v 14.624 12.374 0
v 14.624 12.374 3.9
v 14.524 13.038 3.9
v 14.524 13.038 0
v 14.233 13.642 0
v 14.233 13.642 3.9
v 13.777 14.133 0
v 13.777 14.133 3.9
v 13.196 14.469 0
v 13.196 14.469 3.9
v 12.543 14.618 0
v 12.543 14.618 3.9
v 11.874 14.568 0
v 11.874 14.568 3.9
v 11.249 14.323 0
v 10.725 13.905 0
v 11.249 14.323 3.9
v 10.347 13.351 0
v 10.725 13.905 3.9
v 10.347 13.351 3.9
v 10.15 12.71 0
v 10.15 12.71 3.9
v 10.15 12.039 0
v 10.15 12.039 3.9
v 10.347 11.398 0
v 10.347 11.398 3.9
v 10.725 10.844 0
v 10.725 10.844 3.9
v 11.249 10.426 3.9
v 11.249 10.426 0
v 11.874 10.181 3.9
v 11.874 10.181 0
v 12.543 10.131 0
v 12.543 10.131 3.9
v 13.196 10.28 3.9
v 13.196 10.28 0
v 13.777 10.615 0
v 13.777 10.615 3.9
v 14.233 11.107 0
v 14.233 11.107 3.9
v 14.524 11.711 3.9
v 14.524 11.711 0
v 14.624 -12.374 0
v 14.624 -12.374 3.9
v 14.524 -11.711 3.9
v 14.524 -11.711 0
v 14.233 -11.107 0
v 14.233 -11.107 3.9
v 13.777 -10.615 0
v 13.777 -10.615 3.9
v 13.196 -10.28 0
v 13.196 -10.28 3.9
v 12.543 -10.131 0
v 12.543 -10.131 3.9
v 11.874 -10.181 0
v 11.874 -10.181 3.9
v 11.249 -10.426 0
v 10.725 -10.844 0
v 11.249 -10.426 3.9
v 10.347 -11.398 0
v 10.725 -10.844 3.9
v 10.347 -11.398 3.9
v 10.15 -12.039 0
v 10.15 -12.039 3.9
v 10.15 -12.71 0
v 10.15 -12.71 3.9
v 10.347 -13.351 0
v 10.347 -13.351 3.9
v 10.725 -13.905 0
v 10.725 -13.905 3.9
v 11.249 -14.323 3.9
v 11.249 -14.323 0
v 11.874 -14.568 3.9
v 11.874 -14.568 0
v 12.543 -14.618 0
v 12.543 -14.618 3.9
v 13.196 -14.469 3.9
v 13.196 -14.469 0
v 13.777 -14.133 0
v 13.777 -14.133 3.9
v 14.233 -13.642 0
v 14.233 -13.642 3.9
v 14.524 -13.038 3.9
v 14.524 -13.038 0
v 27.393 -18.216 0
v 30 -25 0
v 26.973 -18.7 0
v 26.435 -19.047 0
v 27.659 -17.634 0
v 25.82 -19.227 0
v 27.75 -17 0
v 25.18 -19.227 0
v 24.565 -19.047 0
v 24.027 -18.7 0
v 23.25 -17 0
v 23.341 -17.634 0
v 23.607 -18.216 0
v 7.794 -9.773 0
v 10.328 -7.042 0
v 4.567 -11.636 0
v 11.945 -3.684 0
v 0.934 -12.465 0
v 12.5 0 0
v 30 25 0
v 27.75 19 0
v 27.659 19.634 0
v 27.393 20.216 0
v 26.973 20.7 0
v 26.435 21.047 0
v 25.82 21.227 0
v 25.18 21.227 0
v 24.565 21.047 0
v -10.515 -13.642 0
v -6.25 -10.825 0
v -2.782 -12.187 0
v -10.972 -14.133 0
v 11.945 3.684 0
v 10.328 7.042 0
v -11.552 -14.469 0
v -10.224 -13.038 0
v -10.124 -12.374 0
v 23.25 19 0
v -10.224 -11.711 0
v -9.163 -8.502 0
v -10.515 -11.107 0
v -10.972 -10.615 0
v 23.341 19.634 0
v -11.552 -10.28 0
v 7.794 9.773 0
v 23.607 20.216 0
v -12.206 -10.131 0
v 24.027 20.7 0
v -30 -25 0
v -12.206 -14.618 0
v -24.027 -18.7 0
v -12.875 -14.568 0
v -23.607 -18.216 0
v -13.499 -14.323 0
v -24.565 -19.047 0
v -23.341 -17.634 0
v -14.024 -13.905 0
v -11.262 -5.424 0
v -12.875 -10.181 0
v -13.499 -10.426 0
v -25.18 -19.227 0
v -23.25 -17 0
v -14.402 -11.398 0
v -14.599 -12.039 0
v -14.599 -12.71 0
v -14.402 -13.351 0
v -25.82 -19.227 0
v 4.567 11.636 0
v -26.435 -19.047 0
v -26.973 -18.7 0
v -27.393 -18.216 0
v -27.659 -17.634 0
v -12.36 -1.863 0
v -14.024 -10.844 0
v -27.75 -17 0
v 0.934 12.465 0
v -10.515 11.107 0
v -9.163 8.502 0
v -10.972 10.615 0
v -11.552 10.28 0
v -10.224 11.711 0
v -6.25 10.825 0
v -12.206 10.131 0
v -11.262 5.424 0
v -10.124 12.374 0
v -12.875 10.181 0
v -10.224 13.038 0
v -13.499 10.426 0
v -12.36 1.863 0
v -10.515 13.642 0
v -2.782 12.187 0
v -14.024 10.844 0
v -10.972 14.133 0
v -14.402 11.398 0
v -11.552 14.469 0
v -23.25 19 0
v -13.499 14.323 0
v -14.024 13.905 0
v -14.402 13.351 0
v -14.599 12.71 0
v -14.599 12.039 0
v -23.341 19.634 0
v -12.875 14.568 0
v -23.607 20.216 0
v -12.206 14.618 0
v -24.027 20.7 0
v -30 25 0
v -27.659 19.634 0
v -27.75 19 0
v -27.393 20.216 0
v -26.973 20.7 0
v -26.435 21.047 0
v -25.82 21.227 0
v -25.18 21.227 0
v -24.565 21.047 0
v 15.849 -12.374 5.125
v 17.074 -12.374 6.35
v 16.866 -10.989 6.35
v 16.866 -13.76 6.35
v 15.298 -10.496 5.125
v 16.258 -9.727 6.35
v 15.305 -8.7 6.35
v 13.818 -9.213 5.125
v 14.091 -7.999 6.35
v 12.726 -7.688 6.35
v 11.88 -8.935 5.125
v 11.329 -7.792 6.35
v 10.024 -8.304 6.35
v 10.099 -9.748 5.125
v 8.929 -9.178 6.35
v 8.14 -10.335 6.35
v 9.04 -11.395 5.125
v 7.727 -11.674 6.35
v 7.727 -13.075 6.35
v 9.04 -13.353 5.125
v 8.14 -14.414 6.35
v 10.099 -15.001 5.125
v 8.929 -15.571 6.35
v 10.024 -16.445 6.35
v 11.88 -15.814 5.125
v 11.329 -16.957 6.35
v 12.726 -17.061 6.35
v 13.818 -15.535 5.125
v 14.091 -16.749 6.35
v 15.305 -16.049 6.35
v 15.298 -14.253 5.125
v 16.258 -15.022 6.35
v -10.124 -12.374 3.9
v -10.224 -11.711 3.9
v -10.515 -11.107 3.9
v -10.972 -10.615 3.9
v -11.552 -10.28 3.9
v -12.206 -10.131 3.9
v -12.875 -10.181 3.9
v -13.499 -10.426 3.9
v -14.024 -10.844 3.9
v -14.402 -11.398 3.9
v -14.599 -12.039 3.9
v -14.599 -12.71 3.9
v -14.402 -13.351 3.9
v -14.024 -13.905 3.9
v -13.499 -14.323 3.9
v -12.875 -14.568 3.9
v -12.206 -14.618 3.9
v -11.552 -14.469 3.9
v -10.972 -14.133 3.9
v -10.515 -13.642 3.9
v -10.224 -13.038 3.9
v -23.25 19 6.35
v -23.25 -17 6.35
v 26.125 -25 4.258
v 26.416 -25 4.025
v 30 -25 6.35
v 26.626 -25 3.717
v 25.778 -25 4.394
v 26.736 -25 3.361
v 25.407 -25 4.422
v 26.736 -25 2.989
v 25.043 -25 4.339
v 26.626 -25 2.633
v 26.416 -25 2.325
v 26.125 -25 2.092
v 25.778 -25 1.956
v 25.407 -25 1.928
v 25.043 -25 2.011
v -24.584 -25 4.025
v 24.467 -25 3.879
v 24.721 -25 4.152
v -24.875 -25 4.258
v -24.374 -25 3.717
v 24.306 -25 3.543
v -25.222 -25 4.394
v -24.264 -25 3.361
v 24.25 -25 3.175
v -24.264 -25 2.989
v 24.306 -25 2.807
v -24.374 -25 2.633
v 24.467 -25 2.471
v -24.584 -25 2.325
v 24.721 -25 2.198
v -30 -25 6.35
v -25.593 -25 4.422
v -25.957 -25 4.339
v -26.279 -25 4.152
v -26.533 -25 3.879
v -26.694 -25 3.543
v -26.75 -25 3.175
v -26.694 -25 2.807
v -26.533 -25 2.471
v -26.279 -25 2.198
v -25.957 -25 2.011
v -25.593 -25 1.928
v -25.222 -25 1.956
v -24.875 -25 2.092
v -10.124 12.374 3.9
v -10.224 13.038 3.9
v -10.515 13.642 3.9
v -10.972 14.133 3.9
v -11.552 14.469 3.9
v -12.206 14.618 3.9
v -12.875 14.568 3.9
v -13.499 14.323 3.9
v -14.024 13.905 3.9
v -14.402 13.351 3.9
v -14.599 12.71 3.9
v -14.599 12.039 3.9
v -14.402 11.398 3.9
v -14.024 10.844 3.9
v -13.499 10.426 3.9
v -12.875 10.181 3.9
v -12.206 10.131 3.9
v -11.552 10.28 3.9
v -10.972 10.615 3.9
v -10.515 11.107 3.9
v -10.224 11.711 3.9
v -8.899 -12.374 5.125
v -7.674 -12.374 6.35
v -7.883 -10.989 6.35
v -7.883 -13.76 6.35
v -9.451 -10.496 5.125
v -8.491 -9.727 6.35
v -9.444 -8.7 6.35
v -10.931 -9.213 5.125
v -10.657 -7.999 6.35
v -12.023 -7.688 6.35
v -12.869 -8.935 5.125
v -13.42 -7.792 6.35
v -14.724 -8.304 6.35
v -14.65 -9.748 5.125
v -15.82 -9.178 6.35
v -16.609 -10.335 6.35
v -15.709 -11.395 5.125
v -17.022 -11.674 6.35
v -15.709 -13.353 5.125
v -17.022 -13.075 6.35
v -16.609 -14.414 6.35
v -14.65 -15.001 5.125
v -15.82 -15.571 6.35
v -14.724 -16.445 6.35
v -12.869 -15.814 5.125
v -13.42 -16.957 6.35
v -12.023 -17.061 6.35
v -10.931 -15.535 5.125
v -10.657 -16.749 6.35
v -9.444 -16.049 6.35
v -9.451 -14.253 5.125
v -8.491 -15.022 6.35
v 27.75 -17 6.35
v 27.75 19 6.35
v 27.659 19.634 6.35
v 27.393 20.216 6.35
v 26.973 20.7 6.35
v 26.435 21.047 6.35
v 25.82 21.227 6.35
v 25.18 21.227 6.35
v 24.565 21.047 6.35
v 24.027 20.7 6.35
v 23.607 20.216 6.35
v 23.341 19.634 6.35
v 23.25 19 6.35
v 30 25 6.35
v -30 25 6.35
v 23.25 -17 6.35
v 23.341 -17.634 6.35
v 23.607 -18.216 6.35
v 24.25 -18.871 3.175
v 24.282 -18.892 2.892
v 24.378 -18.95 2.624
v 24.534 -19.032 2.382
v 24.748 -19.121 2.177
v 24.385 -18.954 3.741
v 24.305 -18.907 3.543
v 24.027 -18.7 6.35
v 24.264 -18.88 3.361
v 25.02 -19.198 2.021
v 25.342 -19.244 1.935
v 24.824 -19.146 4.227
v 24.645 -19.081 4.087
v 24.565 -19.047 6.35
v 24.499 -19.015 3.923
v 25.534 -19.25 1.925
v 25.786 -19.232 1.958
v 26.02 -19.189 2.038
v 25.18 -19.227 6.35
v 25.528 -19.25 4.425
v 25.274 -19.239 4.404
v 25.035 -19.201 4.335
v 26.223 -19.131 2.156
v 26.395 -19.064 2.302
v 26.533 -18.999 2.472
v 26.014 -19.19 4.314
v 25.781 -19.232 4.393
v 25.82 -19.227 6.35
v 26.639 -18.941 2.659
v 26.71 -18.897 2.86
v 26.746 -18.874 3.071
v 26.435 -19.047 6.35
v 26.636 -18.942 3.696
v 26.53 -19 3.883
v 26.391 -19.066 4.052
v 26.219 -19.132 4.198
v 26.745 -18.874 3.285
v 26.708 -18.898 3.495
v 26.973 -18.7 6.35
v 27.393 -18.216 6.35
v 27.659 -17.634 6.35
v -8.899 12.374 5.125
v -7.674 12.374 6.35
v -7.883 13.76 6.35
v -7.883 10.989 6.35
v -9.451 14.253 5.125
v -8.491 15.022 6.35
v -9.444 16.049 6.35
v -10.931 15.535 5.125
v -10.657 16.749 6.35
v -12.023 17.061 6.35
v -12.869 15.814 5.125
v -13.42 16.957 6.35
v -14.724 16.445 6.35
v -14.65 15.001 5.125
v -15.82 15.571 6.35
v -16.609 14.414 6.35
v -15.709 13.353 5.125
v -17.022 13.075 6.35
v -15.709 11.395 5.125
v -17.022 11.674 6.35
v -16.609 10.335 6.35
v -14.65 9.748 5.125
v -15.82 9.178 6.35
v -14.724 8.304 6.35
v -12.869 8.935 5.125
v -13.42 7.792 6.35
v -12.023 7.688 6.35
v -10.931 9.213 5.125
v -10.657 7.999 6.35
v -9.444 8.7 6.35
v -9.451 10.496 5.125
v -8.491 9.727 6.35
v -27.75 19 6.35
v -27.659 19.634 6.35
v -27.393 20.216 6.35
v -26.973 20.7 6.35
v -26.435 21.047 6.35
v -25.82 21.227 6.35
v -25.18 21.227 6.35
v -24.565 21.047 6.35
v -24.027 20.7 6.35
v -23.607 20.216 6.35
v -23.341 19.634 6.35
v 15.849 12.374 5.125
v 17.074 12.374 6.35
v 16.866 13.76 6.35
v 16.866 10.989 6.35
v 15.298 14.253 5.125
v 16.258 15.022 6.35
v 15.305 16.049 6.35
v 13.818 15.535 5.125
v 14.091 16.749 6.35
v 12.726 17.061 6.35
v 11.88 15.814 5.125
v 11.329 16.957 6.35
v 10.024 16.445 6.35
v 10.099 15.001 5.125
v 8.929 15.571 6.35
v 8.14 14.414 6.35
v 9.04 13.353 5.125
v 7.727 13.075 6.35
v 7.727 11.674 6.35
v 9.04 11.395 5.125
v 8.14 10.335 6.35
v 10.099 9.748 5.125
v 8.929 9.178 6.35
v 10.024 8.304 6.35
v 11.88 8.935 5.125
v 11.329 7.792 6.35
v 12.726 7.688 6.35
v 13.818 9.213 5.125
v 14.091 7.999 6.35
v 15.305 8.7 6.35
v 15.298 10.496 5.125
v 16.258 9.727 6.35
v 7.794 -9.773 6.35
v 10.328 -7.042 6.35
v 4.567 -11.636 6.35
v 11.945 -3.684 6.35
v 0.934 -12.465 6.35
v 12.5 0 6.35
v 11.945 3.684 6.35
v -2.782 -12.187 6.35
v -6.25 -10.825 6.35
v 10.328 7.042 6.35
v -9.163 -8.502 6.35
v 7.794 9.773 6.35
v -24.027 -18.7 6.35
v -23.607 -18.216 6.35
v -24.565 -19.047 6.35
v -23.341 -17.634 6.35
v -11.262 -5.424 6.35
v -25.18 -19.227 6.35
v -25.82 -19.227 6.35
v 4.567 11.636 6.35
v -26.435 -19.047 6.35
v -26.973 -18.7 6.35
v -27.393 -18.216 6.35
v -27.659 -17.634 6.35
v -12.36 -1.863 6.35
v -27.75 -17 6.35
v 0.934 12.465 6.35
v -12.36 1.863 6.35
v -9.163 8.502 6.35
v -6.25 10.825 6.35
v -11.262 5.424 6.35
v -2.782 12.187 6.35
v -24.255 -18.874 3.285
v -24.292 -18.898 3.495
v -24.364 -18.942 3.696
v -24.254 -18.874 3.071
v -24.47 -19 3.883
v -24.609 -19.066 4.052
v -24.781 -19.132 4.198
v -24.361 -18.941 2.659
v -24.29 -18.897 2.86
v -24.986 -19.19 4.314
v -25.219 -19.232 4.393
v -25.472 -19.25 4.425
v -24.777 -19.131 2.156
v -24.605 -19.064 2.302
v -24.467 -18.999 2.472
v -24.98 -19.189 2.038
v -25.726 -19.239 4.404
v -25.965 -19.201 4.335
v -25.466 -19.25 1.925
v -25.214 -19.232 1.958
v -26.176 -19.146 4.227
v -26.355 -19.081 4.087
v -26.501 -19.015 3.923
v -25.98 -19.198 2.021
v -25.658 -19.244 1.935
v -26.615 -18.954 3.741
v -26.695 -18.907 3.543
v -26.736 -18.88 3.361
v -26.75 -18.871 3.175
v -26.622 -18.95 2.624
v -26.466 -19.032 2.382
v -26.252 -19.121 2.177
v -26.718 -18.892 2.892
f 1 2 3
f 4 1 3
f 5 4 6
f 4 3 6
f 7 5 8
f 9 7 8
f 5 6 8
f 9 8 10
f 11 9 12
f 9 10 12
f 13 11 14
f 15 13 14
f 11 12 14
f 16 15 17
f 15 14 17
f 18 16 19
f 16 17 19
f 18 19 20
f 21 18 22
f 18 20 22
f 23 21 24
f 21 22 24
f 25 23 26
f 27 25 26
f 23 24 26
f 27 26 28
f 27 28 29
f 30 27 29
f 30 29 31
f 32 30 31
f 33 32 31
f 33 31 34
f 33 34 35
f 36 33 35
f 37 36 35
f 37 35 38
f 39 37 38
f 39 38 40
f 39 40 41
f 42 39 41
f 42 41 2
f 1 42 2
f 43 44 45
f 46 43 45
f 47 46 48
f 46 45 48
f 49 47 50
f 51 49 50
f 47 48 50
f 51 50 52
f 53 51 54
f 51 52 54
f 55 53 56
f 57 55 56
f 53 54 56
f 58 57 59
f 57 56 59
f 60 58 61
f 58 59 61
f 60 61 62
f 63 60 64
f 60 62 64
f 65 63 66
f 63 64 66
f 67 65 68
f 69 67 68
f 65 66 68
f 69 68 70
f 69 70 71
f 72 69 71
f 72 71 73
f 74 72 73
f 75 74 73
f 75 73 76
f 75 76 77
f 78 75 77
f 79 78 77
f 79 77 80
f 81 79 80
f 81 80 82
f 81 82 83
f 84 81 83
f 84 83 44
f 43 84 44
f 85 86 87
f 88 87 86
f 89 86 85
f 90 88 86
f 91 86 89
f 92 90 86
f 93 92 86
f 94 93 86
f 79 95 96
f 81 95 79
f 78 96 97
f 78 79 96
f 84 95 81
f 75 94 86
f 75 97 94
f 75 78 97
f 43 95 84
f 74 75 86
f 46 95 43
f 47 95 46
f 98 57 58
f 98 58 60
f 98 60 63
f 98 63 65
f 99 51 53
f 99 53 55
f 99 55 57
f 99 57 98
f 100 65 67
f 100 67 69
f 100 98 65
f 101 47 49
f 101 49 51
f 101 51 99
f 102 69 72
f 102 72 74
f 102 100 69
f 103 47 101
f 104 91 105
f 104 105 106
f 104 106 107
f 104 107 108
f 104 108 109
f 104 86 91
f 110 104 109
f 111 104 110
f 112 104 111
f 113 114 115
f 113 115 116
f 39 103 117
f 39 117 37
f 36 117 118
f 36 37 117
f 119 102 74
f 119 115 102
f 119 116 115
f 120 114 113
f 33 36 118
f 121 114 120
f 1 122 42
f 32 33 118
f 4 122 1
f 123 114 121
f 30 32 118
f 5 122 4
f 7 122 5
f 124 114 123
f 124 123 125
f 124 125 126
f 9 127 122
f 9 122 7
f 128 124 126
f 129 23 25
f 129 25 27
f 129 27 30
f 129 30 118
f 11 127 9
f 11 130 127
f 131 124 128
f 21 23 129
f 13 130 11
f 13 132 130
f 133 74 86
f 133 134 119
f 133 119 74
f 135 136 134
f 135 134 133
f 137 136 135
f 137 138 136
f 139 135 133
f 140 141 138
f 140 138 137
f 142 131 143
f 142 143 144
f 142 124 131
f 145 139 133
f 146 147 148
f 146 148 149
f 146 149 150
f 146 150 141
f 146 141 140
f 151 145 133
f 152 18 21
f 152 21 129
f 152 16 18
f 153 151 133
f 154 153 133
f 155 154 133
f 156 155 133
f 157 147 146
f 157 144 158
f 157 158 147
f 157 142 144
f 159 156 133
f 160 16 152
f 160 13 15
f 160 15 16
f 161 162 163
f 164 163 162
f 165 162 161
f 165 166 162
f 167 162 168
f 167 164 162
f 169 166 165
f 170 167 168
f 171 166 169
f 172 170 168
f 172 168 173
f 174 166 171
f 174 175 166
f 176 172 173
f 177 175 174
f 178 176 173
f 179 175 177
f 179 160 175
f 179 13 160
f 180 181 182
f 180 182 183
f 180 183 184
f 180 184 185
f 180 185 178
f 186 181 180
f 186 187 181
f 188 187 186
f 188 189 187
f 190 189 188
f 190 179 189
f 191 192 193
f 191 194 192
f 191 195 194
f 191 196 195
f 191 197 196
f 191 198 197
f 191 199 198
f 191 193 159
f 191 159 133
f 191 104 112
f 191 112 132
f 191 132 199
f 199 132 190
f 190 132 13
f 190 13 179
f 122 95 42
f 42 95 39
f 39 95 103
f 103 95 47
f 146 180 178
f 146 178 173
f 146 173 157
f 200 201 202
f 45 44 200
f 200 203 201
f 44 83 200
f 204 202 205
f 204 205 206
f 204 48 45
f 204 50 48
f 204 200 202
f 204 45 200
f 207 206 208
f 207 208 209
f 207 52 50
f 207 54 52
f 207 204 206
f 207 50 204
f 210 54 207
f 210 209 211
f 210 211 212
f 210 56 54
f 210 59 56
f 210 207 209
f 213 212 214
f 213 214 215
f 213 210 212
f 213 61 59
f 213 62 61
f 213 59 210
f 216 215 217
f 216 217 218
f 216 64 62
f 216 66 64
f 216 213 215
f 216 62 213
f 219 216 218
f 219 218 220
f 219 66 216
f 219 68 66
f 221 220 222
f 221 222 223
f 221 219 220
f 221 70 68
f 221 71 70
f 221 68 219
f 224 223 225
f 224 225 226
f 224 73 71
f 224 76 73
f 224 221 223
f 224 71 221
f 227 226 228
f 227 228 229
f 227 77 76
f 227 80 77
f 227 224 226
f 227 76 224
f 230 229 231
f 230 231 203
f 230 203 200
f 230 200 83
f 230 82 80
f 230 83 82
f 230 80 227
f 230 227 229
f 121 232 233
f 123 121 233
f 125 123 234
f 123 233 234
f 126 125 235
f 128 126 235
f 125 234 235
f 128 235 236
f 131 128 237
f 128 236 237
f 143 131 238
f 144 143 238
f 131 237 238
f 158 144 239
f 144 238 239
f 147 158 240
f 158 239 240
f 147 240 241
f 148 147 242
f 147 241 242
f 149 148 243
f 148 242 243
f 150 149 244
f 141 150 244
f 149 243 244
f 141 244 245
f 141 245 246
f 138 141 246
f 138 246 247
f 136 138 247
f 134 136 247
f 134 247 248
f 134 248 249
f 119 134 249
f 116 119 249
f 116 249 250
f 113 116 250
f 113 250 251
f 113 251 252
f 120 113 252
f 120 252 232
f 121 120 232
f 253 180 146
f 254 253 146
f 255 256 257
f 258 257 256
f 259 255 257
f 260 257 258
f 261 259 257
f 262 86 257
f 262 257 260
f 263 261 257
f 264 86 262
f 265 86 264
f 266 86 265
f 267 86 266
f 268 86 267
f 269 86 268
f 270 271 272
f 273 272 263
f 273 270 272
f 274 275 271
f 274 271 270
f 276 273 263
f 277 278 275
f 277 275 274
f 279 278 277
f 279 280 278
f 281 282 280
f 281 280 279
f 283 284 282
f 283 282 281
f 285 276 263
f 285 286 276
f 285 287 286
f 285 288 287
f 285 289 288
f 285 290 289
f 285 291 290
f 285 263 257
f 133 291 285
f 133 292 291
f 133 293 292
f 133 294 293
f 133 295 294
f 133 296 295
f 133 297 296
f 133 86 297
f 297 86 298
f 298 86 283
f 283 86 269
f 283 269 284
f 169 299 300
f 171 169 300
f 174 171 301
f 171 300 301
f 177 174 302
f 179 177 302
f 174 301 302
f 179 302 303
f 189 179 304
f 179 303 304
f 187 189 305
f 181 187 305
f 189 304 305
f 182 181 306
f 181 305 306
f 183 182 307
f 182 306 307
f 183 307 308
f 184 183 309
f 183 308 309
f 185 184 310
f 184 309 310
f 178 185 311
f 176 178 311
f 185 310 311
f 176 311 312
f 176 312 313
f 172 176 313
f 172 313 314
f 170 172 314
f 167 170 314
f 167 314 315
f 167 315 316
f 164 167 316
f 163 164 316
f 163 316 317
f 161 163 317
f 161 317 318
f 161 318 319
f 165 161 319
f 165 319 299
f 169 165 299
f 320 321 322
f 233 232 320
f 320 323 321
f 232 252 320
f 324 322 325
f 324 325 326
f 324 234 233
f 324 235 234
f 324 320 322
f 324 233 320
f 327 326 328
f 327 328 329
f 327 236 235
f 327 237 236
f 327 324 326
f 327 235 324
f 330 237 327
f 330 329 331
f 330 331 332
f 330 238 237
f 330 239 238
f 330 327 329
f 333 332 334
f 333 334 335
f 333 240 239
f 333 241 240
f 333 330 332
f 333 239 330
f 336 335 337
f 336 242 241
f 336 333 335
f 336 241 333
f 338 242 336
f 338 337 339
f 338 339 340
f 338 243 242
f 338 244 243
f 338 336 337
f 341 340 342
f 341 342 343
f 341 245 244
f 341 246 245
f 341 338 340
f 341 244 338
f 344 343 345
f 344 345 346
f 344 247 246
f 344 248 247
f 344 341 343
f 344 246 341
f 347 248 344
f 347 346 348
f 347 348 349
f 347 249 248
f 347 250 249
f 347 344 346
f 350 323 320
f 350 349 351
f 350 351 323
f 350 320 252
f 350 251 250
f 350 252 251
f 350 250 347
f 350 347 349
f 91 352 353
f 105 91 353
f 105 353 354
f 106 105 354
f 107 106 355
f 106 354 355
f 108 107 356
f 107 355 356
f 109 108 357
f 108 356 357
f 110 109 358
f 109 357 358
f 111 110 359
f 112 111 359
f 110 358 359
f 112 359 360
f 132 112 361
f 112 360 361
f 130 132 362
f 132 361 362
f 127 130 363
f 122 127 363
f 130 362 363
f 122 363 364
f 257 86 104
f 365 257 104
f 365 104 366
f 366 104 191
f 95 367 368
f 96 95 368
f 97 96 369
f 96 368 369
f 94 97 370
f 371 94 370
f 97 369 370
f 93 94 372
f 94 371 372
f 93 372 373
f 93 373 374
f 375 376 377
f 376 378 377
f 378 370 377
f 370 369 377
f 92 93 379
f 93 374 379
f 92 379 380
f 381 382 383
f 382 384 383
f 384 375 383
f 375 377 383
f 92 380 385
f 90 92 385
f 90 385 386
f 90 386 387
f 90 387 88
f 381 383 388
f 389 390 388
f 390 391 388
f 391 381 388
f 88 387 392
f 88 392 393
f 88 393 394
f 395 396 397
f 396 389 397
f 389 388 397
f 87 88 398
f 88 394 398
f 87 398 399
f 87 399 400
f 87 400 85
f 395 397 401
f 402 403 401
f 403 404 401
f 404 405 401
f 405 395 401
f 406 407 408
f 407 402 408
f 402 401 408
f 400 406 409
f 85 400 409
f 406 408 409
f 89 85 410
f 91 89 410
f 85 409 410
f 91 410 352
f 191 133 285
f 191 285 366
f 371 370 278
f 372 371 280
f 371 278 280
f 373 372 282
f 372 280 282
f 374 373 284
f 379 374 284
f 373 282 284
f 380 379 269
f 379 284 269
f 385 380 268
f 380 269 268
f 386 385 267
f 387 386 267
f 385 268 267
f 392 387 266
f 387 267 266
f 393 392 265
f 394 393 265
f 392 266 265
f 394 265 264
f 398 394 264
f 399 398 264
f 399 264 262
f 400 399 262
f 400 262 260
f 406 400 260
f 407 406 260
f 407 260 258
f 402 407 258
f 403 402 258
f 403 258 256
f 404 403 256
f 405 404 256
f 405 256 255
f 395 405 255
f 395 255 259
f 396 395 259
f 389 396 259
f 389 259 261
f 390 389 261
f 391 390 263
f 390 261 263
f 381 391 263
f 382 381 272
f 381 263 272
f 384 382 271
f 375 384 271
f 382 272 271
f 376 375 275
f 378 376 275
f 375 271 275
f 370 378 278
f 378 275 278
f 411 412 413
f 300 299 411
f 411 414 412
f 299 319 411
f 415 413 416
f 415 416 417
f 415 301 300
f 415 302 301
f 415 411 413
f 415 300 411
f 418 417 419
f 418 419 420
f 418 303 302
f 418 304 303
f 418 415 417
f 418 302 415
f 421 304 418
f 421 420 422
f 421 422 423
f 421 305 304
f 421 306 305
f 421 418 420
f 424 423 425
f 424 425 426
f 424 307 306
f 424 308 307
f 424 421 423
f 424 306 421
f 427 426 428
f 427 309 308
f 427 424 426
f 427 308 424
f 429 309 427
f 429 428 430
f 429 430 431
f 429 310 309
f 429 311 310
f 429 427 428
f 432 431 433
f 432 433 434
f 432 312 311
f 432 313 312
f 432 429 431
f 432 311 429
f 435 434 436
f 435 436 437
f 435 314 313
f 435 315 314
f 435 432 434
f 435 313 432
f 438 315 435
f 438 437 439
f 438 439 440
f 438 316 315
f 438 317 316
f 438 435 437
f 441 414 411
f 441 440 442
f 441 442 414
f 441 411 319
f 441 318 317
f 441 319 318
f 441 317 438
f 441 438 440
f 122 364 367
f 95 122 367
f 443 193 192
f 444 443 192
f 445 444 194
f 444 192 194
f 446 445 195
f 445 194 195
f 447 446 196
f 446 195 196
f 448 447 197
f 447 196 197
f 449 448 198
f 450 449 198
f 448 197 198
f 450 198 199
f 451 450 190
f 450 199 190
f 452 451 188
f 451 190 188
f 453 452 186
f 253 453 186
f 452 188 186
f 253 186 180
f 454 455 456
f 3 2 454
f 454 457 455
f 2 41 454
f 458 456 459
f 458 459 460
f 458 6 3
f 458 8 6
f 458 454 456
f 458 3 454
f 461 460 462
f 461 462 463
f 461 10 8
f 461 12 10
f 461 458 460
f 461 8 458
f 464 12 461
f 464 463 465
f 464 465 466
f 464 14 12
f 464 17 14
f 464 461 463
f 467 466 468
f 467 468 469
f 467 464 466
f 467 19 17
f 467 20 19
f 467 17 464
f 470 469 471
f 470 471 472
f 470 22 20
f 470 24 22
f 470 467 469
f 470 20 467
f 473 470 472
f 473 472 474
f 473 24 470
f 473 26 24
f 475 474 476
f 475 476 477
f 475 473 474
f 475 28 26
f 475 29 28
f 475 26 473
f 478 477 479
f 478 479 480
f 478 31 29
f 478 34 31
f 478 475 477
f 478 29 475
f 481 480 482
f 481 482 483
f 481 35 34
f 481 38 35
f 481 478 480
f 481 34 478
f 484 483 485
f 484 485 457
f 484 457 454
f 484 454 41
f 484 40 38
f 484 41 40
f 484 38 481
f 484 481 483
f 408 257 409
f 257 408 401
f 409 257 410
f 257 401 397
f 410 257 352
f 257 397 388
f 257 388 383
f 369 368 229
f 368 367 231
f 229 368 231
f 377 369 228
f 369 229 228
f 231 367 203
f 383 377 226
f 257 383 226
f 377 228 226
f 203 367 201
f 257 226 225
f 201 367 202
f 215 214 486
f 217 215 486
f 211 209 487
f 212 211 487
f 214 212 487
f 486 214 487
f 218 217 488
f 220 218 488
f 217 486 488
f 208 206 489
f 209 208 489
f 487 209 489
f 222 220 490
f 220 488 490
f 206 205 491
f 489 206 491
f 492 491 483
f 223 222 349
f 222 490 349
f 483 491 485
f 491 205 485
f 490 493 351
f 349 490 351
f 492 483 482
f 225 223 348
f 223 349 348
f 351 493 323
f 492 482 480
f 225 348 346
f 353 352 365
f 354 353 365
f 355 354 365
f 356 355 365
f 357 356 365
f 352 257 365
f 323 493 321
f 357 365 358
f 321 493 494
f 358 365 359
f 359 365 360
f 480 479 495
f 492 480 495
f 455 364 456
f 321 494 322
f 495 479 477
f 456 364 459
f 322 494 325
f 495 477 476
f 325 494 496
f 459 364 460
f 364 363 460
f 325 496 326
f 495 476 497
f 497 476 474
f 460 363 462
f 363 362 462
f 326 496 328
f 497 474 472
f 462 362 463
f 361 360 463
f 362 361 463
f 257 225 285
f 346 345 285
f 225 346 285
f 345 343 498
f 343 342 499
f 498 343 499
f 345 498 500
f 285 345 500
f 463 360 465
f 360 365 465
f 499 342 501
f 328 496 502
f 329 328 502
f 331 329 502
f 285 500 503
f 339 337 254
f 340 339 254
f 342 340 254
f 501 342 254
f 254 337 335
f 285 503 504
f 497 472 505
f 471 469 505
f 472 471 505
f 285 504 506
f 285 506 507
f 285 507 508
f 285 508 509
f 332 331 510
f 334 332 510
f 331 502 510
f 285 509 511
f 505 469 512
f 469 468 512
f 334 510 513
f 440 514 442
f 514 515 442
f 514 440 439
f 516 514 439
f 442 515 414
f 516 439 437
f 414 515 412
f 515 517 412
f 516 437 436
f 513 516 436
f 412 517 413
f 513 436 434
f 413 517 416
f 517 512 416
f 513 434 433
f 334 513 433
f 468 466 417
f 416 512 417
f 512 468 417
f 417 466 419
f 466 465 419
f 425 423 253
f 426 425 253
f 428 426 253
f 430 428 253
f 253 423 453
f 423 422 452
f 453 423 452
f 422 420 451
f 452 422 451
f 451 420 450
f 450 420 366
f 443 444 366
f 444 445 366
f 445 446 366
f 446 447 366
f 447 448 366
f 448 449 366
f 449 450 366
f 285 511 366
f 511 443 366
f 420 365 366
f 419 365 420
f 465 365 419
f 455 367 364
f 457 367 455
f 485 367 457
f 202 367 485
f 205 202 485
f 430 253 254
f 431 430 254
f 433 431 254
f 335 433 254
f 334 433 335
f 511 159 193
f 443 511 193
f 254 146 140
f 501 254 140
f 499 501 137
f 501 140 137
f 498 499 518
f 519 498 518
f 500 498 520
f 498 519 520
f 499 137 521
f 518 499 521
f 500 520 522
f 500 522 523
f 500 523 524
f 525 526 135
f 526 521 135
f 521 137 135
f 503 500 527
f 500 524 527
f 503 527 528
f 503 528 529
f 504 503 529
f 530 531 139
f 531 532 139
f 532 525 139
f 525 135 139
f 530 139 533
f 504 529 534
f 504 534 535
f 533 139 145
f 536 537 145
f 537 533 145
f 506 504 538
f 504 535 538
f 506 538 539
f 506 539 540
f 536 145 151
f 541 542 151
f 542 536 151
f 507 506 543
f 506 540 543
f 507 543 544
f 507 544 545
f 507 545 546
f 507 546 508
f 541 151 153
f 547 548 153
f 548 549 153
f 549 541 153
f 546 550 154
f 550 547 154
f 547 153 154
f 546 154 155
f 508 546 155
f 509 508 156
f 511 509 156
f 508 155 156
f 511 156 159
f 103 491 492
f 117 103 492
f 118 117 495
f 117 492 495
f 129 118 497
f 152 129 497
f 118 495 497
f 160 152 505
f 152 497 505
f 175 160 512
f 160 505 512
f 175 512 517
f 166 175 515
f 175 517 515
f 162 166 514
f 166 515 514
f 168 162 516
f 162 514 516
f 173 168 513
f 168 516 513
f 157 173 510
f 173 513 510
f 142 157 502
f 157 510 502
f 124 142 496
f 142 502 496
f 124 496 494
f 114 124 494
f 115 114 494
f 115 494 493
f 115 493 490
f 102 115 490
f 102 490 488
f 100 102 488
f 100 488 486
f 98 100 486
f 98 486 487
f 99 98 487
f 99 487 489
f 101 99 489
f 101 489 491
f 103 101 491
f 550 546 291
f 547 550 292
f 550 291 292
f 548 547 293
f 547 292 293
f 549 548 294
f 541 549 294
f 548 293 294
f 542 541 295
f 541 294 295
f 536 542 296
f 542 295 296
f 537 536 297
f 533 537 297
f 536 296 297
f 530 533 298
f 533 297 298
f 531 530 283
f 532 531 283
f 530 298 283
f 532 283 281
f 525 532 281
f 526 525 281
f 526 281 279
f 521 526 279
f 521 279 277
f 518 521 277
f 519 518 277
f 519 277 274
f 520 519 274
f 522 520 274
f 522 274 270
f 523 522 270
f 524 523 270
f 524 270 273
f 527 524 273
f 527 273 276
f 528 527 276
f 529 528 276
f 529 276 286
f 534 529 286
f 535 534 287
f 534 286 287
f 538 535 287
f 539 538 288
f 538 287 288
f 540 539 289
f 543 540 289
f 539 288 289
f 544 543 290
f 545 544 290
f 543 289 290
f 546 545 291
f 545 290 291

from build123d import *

# Parameters (mm, degrees)
SKETCH1_W                  = 60
SKETCH1_H                  = 50
BOSS_EXTRUDE1_DEPTH        = 6.35
CUT_EXTRUDE1_DEPTH         = 40.564156758
CUT_EXTRUDE2_DEPTH         = 40.564156758
HOLE1_D                    = 25
F_2_CLEARANCE_HOLE1_REACH  = 60.654
F_2_CLEARANCE_HOLE1_BORE_R = 1.25
F_8_CLEARANCE_HOLE1_D      = 4.499991
CHAMFER1_SIZE              = 2.449999926


with BuildPart() as part:
    # Sketch1 → Boss-Extrude1 (new body)
    with BuildSketch(Plane(origin=(0, 0, 0), x_dir=(-1, 0, 0), z_dir=(0, 0, -1))):
        Rectangle(SKETCH1_W, SKETCH1_H)
    extrude(amount=-BOSS_EXTRUDE1_DEPTH)

    # Sketch2 → Cut-Extrude1 (cut, through all)
    with BuildSketch(Plane(origin=(0, 0, 0), x_dir=(-1, 0, 0), z_dir=(0, 0, -1))):
        with BuildLine():
            Line((23.25, 19), (23.25, -17))
            ThreePointArc((23.25, -17), (25.5, -19.25), (27.75, -17))
            Line((27.75, -17), (27.75, 19))
            ThreePointArc((27.75, 19), (25.5, 21.25), (23.25, 19))
        make_face()
    extrude(amount=-CUT_EXTRUDE1_DEPTH, mode=Mode.SUBTRACT)

    # Sketch3 → Cut-Extrude2 (cut, through all)
    with BuildSketch(Plane.XY.offset(6.35)):
        with BuildLine():
            Line((27.75, -17), (27.75, 19))
            ThreePointArc((27.75, 19), (25.5, 21.25), (23.25, 19))
            Line((23.25, 19), (23.25, -17))
            ThreePointArc((23.25, -17), (25.5, -19.25), (27.75, -17))
        make_face()
    extrude(amount=-CUT_EXTRUDE2_DEPTH, mode=Mode.SUBTRACT)

    # Hole1 (through all)
    with Locations(Plane(origin=(0, 0, 0), x_dir=(-1, 0, 0), z_dir=(0, 0, -1))):
        with Locations((0, 0)):
            Hole(HOLE1_D / 2)

    # #2 Clearance Hole1 bore → #2 Clearance Hole1 (cut, up to next)
    with BuildSketch(Plane(origin=(0, -25, 0), x_dir=(-1, 0, 0), z_dir=(0, -1, 0)), mode=Mode.PRIVATE) as f_2_clearance_hole1_sk1:
        with Locations((-25.5, -3.175)):
            Circle(F_2_CLEARANCE_HOLE1_BORE_R)
    f_2_clearance_hole1_tool1 = extrude(f_2_clearance_hole1_sk1.sketch, amount=-F_2_CLEARANCE_HOLE1_REACH, mode=Mode.PRIVATE) & part.part
    # #2 Clearance Hole1 bore → #2 Clearance Hole1 (cut, up to next)
    with BuildSketch(Plane(origin=(0, -25, 0), x_dir=(-1, 0, 0), z_dir=(0, -1, 0)), mode=Mode.PRIVATE) as f_2_clearance_hole1_sk2:
        with Locations((25.5, -3.175)):
            Circle(F_2_CLEARANCE_HOLE1_BORE_R)
    f_2_clearance_hole1_tool2 = extrude(f_2_clearance_hole1_sk2.sketch, amount=-F_2_CLEARANCE_HOLE1_REACH, mode=Mode.PRIVATE) & part.part
    add(f_2_clearance_hole1_tool1.solids().sort_by_distance((25.5, -25, 3.175))[0], mode=Mode.SUBTRACT)
    add(f_2_clearance_hole1_tool2.solids().sort_by_distance((-25.5, -25, 3.175))[0], mode=Mode.SUBTRACT)

    # #8 Clearance Hole1 (through all)
    with Locations(Plane(origin=(0, 0, 0), x_dir=(-1, 0, 0), z_dir=(0, 0, -1))):
        with Locations((-12.374368671, 12.374368671), (-12.374368671, -12.374368671), (12.374368671, -12.374368671), (12.374368671, 12.374368671)):
            Hole(F_8_CLEARANCE_HOLE1_D / 2)

    # Chamfer1
    chamfer1_edges = [part.edges().sort_by_distance(p)[0] for p in [
        (-14.624364171, 12.374368671, 6.35),
        (-14.624364171, -12.374368671, 6.35),
        (10.124373171, -12.374368671, 6.35),
        (10.124373171, 12.374368671, 6.35),
    ]]
    chamfer(chamfer1_edges, length=CHAMFER1_SIZE)


solid = part.part
